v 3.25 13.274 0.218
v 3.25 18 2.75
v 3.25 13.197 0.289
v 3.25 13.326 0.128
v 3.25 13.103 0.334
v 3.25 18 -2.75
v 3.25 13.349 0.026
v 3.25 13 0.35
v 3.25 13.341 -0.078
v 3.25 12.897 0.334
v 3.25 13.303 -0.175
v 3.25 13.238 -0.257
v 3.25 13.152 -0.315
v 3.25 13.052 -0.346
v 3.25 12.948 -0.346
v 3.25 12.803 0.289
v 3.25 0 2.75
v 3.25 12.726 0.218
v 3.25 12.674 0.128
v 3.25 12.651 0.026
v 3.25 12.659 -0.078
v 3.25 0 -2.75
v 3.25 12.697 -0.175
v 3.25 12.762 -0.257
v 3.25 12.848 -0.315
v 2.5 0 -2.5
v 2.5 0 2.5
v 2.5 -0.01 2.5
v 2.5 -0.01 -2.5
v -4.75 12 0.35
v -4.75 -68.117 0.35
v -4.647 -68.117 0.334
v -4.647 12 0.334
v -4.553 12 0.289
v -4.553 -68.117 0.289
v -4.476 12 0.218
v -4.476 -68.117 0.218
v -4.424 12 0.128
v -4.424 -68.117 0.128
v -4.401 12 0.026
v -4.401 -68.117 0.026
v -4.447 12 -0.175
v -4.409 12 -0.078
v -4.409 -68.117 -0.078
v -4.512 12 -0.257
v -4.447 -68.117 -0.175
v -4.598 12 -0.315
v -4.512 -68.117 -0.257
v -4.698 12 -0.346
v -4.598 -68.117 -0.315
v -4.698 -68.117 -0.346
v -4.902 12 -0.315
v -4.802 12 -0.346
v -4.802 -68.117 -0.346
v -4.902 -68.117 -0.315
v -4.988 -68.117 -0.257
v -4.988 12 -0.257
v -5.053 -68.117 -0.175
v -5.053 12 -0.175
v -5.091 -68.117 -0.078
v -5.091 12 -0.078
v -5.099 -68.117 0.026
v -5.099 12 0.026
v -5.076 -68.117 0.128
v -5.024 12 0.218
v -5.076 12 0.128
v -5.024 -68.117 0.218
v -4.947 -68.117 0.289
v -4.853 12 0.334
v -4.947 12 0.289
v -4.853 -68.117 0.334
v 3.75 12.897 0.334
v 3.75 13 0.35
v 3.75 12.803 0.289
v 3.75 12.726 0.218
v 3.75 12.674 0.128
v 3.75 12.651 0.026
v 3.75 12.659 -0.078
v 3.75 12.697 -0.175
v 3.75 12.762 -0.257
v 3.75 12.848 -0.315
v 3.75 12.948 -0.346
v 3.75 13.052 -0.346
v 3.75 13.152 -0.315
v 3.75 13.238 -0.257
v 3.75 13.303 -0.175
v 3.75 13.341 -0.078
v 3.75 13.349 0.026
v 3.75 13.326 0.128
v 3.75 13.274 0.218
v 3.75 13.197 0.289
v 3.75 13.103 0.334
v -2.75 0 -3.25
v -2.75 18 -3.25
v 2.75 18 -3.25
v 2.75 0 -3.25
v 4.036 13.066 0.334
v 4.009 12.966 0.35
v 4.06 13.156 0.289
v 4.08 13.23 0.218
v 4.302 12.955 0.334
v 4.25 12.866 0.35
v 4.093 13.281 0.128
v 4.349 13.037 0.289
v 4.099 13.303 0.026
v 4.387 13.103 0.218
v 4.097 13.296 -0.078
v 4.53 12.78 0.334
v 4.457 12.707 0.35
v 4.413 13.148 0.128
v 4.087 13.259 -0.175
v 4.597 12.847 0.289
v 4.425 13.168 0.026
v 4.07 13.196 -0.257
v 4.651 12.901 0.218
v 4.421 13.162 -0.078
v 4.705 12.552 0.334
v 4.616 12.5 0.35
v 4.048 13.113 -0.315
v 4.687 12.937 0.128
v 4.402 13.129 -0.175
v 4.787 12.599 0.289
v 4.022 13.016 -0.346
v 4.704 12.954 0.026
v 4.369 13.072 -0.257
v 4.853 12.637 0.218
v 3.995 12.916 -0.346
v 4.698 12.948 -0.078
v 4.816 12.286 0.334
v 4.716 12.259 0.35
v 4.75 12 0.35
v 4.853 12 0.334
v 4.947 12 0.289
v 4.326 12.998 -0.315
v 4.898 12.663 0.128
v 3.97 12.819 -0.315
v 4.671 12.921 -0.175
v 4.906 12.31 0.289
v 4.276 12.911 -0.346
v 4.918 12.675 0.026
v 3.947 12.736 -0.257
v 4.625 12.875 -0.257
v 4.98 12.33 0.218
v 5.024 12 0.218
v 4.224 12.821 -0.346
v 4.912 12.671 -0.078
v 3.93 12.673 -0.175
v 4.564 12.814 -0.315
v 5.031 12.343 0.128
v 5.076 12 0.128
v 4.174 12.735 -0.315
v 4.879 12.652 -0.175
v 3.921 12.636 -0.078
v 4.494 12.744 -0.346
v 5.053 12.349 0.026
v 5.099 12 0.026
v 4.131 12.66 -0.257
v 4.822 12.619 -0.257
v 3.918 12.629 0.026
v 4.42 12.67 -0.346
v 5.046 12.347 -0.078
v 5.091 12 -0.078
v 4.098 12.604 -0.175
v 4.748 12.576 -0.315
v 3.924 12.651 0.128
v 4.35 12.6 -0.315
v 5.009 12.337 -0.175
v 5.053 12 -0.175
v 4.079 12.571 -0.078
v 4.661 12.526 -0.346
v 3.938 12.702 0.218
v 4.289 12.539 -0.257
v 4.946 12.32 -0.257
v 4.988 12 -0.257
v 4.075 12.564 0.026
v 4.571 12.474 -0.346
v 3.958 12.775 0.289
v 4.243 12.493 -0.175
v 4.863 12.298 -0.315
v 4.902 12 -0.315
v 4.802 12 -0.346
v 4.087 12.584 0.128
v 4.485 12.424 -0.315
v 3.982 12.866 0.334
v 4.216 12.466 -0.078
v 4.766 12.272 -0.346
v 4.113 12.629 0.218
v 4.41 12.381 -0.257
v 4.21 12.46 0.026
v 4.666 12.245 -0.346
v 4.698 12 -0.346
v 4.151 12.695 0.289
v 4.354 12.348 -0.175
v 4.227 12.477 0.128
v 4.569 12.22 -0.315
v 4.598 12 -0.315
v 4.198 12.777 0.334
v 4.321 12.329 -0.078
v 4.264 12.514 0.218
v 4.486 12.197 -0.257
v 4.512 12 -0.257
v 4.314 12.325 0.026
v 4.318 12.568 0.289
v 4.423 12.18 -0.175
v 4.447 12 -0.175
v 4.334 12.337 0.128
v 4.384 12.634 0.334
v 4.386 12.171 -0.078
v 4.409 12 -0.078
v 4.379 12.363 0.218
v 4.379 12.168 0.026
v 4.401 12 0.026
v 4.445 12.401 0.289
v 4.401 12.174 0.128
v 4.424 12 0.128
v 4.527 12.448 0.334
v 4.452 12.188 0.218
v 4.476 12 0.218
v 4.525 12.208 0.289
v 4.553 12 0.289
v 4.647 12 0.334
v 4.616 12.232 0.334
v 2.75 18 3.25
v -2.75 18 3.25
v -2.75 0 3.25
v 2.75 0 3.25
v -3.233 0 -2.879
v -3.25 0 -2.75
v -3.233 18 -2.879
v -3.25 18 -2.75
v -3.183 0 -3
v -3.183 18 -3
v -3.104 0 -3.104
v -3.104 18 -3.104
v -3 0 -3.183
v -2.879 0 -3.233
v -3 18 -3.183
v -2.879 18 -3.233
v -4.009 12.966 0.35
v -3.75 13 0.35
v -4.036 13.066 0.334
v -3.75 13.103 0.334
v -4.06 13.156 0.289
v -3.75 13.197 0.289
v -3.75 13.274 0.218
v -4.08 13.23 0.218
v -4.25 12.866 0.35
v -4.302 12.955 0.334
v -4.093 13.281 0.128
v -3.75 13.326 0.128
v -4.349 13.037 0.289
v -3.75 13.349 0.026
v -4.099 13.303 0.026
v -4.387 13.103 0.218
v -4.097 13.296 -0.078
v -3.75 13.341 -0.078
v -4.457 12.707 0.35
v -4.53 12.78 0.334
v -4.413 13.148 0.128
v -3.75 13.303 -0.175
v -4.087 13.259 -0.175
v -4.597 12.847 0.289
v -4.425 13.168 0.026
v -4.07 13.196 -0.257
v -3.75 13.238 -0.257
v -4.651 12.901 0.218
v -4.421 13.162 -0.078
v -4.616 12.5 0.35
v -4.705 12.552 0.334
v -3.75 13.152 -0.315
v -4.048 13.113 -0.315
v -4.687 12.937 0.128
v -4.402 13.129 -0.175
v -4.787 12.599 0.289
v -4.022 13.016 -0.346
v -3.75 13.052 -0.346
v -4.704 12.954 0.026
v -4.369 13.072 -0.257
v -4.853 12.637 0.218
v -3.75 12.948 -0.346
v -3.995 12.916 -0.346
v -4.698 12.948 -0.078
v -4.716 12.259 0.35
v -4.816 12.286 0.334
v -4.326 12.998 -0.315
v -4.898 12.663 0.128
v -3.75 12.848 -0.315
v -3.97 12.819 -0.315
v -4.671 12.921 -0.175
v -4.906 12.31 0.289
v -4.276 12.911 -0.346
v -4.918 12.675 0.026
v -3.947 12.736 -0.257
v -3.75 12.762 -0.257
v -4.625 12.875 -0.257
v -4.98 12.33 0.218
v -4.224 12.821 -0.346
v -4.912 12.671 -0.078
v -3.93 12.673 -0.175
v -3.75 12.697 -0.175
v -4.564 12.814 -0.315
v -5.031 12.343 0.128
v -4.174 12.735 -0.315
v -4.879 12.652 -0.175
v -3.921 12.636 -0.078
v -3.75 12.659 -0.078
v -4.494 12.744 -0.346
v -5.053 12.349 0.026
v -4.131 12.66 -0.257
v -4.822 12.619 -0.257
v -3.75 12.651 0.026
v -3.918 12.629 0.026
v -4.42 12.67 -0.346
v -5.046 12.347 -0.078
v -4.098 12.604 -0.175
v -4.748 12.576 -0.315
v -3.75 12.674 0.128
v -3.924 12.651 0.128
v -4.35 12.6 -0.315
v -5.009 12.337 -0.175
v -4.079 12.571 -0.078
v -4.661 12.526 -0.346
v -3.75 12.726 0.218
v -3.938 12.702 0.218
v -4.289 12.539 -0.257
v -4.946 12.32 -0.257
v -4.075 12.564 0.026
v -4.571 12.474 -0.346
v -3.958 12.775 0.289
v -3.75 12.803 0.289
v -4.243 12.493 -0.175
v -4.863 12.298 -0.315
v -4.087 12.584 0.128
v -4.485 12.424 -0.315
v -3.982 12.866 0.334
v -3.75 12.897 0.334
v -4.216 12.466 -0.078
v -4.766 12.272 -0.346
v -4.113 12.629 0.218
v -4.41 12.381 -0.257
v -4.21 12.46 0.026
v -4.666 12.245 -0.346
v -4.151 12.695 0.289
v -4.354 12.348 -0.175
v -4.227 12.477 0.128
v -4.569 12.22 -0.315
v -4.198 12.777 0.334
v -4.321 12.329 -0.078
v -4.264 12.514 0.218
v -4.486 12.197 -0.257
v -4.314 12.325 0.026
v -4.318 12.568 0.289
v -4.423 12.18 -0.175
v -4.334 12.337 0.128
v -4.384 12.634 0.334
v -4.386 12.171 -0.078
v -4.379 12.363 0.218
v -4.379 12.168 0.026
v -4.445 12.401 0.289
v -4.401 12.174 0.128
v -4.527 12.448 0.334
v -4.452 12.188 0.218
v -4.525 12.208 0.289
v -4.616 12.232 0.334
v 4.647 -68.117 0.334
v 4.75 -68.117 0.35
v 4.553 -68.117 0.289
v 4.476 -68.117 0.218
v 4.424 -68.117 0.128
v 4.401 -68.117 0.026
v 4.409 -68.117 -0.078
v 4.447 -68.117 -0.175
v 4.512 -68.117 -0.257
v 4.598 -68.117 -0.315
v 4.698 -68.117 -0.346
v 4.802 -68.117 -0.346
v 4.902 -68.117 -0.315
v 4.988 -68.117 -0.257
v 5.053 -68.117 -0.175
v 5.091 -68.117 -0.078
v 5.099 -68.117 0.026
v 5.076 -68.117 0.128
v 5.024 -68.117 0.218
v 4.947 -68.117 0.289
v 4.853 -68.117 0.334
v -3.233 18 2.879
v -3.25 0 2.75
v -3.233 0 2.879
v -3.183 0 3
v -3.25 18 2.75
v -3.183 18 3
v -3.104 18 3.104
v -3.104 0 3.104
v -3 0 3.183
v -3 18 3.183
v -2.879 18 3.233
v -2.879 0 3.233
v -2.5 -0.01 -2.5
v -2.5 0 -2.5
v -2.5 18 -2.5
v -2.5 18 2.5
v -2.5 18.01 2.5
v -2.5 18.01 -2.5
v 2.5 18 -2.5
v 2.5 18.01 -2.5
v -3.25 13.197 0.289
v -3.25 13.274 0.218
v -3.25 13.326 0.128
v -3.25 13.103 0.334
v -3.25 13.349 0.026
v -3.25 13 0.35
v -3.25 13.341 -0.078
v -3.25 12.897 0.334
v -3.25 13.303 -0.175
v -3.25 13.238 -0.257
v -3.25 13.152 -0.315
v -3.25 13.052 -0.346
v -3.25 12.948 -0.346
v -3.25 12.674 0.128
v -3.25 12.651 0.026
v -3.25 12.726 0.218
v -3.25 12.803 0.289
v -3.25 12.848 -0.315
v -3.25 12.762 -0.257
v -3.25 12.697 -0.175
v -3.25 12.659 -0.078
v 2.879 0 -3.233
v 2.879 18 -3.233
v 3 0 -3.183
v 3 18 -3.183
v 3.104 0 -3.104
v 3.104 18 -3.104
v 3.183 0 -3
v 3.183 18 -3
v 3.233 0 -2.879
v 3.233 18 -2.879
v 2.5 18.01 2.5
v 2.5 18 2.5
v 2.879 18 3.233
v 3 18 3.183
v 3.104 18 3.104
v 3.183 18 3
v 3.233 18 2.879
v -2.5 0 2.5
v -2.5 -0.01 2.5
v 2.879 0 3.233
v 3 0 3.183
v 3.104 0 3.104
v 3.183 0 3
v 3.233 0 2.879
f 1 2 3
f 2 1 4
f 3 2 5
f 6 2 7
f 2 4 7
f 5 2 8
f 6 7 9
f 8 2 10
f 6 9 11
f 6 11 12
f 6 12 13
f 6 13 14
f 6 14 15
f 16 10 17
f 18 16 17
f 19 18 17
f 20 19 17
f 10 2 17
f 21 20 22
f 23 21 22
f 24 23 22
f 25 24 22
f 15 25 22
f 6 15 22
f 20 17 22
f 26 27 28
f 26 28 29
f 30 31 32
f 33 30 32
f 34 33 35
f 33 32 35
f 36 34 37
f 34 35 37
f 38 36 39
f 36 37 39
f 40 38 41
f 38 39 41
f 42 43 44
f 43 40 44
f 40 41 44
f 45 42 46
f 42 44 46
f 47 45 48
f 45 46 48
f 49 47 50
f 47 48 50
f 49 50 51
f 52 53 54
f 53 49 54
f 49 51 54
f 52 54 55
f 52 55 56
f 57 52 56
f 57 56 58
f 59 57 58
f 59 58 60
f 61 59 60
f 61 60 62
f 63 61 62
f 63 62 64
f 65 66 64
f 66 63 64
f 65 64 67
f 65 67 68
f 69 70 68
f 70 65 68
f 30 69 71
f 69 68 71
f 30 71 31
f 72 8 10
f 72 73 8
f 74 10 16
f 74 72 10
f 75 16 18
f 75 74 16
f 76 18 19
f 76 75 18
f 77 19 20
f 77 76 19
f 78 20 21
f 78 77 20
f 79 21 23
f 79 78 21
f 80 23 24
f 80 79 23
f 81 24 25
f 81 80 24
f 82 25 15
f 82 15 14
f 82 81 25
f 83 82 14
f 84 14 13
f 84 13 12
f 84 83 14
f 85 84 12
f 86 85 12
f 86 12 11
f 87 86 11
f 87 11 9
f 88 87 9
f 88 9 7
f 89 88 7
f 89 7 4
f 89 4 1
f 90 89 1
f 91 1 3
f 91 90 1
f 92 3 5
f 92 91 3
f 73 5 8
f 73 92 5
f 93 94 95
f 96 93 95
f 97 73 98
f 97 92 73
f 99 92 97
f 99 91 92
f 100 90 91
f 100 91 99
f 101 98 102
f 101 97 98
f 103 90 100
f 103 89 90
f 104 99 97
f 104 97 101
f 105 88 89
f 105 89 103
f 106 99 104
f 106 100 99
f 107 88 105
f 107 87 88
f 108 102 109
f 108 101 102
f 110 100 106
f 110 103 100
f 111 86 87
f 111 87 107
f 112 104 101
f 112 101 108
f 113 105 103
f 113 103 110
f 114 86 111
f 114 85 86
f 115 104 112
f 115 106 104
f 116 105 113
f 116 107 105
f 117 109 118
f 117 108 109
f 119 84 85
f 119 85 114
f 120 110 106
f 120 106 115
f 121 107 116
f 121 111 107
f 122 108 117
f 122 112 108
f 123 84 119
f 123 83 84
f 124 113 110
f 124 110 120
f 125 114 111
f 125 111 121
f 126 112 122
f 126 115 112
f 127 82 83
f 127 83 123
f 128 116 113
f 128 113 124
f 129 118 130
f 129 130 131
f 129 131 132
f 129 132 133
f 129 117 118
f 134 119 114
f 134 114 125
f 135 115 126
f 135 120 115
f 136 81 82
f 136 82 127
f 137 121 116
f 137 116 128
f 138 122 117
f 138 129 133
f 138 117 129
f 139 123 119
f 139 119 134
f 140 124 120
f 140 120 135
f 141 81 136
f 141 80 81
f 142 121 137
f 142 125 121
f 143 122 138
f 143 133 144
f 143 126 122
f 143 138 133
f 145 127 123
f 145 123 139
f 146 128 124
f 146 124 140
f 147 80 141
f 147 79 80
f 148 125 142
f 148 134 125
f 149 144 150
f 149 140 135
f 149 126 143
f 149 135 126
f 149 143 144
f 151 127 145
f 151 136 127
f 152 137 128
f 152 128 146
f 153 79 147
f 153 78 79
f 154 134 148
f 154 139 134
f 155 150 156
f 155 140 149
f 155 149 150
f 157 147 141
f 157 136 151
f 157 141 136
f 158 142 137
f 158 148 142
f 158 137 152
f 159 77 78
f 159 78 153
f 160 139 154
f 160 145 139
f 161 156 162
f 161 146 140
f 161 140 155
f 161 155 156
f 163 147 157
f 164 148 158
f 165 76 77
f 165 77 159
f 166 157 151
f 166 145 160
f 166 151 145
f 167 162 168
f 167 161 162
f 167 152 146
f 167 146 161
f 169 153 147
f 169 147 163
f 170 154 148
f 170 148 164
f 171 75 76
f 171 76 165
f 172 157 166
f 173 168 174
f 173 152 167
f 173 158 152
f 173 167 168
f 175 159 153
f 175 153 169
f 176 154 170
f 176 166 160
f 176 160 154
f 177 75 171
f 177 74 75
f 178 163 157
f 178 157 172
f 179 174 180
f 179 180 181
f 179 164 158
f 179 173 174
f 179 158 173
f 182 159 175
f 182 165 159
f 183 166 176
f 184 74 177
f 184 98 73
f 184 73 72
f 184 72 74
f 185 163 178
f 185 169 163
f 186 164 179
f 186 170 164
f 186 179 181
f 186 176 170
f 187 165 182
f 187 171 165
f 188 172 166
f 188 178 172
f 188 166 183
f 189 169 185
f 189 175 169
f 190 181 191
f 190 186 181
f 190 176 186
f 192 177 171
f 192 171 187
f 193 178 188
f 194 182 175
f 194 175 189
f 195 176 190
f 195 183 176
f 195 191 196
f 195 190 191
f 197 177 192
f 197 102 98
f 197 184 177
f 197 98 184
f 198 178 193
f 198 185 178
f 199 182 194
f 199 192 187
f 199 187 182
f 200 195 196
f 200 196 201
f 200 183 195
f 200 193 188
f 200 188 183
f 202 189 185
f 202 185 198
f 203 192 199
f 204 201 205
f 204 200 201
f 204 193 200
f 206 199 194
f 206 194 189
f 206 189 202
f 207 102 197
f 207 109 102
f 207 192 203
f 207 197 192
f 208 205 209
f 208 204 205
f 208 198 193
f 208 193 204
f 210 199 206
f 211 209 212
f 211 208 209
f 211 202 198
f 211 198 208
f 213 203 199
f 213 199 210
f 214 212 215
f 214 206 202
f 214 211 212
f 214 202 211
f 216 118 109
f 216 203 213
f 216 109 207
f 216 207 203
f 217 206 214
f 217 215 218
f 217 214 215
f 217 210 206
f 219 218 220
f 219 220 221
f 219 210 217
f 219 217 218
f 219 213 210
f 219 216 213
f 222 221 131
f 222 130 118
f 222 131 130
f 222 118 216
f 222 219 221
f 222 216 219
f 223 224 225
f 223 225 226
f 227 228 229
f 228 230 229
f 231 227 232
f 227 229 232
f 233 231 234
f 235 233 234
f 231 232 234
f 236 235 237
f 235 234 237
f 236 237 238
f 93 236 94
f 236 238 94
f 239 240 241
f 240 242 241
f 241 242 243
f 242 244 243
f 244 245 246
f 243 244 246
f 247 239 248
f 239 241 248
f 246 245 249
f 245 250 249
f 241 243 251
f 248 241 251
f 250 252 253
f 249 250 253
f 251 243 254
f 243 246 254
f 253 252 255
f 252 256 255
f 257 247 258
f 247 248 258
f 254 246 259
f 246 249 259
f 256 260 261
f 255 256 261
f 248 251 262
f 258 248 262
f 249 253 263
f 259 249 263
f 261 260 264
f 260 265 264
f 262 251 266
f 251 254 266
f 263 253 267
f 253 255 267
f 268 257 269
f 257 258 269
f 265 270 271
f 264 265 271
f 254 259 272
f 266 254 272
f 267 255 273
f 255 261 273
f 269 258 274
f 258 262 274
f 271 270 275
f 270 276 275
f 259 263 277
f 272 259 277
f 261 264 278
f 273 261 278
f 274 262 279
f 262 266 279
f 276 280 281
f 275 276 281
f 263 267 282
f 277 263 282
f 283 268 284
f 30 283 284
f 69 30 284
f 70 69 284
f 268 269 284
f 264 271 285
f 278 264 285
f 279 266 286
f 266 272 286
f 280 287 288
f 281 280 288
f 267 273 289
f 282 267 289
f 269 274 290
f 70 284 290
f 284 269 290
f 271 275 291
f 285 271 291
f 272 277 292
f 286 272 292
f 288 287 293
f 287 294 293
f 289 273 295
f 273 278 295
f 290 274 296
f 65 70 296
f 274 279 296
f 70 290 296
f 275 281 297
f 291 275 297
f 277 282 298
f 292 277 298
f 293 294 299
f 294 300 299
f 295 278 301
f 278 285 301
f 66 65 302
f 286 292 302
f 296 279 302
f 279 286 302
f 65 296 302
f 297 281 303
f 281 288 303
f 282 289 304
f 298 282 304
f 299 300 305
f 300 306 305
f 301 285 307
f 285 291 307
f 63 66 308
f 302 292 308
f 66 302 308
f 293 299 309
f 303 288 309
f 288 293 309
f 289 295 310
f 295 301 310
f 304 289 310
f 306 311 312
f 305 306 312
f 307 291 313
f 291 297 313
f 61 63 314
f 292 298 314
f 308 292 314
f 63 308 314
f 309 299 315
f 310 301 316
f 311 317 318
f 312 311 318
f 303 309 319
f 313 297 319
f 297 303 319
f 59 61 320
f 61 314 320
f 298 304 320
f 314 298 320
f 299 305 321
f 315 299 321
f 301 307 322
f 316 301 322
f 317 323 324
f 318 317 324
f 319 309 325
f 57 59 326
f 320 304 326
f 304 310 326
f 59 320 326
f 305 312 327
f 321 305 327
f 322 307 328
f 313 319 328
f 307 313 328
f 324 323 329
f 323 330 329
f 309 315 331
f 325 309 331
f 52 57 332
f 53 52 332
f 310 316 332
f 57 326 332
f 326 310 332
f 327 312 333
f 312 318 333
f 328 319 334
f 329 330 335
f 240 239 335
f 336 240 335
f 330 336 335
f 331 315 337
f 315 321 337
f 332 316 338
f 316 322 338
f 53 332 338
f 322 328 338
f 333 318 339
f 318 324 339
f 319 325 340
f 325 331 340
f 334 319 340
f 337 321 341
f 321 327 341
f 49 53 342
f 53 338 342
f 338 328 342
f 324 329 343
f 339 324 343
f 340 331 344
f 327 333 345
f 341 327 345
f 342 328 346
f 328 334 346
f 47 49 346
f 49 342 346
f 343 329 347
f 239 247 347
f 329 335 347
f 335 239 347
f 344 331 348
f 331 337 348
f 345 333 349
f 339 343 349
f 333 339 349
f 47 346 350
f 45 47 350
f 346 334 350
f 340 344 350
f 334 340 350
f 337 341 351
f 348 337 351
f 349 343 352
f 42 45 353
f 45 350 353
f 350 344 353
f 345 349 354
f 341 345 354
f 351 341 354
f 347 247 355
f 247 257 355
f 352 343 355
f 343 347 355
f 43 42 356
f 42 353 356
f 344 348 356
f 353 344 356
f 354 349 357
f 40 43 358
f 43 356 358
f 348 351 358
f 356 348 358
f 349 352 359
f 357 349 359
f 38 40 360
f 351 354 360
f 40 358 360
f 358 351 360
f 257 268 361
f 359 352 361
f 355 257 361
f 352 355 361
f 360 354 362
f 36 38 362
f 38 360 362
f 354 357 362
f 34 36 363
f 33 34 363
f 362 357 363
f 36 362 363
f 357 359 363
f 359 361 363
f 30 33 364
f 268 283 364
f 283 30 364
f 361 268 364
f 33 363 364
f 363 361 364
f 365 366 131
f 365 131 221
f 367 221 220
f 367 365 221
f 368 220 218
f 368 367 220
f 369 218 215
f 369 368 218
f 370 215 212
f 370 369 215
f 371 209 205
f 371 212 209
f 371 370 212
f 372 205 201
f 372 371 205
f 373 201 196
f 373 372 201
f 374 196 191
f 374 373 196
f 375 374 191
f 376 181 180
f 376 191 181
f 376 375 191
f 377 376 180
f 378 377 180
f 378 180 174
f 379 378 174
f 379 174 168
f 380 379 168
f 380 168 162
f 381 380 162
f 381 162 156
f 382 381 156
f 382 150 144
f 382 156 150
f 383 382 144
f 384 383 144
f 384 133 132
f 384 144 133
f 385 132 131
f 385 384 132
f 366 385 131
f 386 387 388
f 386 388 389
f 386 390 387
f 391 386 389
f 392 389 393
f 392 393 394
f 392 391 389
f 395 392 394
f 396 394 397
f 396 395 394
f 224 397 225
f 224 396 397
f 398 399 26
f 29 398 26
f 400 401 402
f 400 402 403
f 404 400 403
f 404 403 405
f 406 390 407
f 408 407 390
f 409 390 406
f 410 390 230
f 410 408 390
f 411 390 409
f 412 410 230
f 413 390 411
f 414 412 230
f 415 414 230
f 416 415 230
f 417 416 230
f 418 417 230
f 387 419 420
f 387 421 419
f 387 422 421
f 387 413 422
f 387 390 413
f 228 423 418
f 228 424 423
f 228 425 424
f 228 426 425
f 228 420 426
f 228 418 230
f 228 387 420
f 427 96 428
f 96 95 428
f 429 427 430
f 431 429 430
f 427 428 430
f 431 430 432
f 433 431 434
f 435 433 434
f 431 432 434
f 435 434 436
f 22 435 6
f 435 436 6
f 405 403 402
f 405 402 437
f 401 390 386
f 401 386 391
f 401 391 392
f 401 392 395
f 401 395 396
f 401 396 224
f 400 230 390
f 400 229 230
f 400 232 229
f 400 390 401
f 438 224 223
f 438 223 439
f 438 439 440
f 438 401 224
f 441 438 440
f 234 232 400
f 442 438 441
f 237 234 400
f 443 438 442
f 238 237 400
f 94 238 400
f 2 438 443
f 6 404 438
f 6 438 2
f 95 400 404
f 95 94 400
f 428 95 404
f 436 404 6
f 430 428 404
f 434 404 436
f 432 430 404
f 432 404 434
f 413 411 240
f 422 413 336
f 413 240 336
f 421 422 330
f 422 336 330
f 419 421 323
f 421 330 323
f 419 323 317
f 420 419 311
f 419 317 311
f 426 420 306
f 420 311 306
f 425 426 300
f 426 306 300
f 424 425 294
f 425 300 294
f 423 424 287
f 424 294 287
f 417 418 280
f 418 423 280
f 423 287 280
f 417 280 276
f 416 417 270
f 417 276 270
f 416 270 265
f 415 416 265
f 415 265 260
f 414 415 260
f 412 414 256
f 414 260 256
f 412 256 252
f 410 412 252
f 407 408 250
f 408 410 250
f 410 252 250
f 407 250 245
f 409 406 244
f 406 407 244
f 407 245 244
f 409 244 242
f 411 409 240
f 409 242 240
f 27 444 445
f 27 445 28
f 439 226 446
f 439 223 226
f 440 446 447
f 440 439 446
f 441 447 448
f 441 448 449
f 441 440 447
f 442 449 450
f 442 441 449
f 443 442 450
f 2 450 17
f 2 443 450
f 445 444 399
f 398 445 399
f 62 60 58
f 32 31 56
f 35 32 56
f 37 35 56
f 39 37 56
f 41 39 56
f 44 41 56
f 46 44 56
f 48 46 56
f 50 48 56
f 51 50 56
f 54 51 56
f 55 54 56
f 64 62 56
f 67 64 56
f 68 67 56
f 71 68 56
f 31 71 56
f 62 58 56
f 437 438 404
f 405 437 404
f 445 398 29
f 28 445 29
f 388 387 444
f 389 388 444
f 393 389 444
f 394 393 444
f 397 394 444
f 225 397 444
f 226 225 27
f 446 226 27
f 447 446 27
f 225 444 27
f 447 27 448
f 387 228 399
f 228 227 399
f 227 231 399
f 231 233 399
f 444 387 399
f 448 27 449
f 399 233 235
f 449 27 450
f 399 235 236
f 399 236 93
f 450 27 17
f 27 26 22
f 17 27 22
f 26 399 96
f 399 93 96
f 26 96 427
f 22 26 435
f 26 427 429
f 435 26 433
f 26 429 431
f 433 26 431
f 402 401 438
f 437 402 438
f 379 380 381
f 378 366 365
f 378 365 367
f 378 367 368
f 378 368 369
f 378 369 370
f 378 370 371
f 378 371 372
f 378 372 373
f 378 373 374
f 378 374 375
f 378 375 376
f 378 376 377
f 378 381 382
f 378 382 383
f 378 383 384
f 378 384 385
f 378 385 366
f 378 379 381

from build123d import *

# Parameters (mm, degrees)
SKETCH1_W                = 6.5
SKETCH1_H                = 6.5
BOSS_EXTRUDE1_DEPTH      = 18
SKETCH2_W                = 5
SKETCH2_H                = 5
BOSS_EXTRUDE2_DEPTH      = 18.01
BOSS_EXTRUDE2_DEPTH_BACK = 0.01
SWEEP2_PROFILE_R         = 0.35
FILLET2_R                = 0.5


with BuildPart() as part:
    # Sketch1 → Boss-Extrude1 (new body)
    with BuildSketch(Plane(origin=(0, 0, 0), x_dir=(1, 0, 0), z_dir=(0, 1, 0))):
        Rectangle(SKETCH1_W, SKETCH1_H)
    boss_extrude1 = extrude(amount=BOSS_EXTRUDE1_DEPTH)

    # Sketch2 → Boss-Extrude2 (add, two sides)
    with BuildSketch(Plane(origin=(0, 0, 0), x_dir=(1, 0, 0), z_dir=(0, 1, 0))) as boss_extrude2_sk:
        Rectangle(SKETCH2_W, SKETCH2_H)
    extrude(amount=BOSS_EXTRUDE2_DEPTH)
    extrude(boss_extrude2_sk.sketch, amount=-BOSS_EXTRUDE2_DEPTH_BACK)

    # Sweep2: sweep along a path in Sketch4
    with BuildLine(Plane.XY) as sweep2_path:
        Line((3.2, 13), (3.25, 13))
        Line((3.25, 13), (3.75, 13))
        ThreePointArc((3.75, 13), (4.457106781, 12.707106781), (4.75, 12))
        Line((4.75, 12), (4.75, -68.117103267))
    # Sweep2 profile (on start of the path) → Sweep2 (sweep)
    with BuildSketch(Plane(origin=(3.2, 13, 0), x_dir=(0, 0, 1), z_dir=(1, 0, 0))):
        Circle(SWEEP2_PROFILE_R)
    sweep2 = sweep(path=sweep2_path.line)

    # Mirror1: Boss-Extrude1, Sweep2 across plane
    add(boss_extrude1.mirror(Plane(origin=(0, 0, 0), x_dir=(0, 0, 1), z_dir=(1, 0, 0))))
    add(sweep2.mirror(Plane(origin=(0, 0, 0), x_dir=(0, 0, 1), z_dir=(1, 0, 0))))

    # Fillet2
    fillet2_edges = [part.edges().sort_by_distance(p)[0] for p in [
        (3.25, 9, 3.25),
        (-3.25, 9, 3.25),
        (-3.25, 9, -3.25),
        (3.25, 9, -3.25),
    ]]
    fillet(fillet2_edges, radius=FILLET2_R)


solid = part.part
